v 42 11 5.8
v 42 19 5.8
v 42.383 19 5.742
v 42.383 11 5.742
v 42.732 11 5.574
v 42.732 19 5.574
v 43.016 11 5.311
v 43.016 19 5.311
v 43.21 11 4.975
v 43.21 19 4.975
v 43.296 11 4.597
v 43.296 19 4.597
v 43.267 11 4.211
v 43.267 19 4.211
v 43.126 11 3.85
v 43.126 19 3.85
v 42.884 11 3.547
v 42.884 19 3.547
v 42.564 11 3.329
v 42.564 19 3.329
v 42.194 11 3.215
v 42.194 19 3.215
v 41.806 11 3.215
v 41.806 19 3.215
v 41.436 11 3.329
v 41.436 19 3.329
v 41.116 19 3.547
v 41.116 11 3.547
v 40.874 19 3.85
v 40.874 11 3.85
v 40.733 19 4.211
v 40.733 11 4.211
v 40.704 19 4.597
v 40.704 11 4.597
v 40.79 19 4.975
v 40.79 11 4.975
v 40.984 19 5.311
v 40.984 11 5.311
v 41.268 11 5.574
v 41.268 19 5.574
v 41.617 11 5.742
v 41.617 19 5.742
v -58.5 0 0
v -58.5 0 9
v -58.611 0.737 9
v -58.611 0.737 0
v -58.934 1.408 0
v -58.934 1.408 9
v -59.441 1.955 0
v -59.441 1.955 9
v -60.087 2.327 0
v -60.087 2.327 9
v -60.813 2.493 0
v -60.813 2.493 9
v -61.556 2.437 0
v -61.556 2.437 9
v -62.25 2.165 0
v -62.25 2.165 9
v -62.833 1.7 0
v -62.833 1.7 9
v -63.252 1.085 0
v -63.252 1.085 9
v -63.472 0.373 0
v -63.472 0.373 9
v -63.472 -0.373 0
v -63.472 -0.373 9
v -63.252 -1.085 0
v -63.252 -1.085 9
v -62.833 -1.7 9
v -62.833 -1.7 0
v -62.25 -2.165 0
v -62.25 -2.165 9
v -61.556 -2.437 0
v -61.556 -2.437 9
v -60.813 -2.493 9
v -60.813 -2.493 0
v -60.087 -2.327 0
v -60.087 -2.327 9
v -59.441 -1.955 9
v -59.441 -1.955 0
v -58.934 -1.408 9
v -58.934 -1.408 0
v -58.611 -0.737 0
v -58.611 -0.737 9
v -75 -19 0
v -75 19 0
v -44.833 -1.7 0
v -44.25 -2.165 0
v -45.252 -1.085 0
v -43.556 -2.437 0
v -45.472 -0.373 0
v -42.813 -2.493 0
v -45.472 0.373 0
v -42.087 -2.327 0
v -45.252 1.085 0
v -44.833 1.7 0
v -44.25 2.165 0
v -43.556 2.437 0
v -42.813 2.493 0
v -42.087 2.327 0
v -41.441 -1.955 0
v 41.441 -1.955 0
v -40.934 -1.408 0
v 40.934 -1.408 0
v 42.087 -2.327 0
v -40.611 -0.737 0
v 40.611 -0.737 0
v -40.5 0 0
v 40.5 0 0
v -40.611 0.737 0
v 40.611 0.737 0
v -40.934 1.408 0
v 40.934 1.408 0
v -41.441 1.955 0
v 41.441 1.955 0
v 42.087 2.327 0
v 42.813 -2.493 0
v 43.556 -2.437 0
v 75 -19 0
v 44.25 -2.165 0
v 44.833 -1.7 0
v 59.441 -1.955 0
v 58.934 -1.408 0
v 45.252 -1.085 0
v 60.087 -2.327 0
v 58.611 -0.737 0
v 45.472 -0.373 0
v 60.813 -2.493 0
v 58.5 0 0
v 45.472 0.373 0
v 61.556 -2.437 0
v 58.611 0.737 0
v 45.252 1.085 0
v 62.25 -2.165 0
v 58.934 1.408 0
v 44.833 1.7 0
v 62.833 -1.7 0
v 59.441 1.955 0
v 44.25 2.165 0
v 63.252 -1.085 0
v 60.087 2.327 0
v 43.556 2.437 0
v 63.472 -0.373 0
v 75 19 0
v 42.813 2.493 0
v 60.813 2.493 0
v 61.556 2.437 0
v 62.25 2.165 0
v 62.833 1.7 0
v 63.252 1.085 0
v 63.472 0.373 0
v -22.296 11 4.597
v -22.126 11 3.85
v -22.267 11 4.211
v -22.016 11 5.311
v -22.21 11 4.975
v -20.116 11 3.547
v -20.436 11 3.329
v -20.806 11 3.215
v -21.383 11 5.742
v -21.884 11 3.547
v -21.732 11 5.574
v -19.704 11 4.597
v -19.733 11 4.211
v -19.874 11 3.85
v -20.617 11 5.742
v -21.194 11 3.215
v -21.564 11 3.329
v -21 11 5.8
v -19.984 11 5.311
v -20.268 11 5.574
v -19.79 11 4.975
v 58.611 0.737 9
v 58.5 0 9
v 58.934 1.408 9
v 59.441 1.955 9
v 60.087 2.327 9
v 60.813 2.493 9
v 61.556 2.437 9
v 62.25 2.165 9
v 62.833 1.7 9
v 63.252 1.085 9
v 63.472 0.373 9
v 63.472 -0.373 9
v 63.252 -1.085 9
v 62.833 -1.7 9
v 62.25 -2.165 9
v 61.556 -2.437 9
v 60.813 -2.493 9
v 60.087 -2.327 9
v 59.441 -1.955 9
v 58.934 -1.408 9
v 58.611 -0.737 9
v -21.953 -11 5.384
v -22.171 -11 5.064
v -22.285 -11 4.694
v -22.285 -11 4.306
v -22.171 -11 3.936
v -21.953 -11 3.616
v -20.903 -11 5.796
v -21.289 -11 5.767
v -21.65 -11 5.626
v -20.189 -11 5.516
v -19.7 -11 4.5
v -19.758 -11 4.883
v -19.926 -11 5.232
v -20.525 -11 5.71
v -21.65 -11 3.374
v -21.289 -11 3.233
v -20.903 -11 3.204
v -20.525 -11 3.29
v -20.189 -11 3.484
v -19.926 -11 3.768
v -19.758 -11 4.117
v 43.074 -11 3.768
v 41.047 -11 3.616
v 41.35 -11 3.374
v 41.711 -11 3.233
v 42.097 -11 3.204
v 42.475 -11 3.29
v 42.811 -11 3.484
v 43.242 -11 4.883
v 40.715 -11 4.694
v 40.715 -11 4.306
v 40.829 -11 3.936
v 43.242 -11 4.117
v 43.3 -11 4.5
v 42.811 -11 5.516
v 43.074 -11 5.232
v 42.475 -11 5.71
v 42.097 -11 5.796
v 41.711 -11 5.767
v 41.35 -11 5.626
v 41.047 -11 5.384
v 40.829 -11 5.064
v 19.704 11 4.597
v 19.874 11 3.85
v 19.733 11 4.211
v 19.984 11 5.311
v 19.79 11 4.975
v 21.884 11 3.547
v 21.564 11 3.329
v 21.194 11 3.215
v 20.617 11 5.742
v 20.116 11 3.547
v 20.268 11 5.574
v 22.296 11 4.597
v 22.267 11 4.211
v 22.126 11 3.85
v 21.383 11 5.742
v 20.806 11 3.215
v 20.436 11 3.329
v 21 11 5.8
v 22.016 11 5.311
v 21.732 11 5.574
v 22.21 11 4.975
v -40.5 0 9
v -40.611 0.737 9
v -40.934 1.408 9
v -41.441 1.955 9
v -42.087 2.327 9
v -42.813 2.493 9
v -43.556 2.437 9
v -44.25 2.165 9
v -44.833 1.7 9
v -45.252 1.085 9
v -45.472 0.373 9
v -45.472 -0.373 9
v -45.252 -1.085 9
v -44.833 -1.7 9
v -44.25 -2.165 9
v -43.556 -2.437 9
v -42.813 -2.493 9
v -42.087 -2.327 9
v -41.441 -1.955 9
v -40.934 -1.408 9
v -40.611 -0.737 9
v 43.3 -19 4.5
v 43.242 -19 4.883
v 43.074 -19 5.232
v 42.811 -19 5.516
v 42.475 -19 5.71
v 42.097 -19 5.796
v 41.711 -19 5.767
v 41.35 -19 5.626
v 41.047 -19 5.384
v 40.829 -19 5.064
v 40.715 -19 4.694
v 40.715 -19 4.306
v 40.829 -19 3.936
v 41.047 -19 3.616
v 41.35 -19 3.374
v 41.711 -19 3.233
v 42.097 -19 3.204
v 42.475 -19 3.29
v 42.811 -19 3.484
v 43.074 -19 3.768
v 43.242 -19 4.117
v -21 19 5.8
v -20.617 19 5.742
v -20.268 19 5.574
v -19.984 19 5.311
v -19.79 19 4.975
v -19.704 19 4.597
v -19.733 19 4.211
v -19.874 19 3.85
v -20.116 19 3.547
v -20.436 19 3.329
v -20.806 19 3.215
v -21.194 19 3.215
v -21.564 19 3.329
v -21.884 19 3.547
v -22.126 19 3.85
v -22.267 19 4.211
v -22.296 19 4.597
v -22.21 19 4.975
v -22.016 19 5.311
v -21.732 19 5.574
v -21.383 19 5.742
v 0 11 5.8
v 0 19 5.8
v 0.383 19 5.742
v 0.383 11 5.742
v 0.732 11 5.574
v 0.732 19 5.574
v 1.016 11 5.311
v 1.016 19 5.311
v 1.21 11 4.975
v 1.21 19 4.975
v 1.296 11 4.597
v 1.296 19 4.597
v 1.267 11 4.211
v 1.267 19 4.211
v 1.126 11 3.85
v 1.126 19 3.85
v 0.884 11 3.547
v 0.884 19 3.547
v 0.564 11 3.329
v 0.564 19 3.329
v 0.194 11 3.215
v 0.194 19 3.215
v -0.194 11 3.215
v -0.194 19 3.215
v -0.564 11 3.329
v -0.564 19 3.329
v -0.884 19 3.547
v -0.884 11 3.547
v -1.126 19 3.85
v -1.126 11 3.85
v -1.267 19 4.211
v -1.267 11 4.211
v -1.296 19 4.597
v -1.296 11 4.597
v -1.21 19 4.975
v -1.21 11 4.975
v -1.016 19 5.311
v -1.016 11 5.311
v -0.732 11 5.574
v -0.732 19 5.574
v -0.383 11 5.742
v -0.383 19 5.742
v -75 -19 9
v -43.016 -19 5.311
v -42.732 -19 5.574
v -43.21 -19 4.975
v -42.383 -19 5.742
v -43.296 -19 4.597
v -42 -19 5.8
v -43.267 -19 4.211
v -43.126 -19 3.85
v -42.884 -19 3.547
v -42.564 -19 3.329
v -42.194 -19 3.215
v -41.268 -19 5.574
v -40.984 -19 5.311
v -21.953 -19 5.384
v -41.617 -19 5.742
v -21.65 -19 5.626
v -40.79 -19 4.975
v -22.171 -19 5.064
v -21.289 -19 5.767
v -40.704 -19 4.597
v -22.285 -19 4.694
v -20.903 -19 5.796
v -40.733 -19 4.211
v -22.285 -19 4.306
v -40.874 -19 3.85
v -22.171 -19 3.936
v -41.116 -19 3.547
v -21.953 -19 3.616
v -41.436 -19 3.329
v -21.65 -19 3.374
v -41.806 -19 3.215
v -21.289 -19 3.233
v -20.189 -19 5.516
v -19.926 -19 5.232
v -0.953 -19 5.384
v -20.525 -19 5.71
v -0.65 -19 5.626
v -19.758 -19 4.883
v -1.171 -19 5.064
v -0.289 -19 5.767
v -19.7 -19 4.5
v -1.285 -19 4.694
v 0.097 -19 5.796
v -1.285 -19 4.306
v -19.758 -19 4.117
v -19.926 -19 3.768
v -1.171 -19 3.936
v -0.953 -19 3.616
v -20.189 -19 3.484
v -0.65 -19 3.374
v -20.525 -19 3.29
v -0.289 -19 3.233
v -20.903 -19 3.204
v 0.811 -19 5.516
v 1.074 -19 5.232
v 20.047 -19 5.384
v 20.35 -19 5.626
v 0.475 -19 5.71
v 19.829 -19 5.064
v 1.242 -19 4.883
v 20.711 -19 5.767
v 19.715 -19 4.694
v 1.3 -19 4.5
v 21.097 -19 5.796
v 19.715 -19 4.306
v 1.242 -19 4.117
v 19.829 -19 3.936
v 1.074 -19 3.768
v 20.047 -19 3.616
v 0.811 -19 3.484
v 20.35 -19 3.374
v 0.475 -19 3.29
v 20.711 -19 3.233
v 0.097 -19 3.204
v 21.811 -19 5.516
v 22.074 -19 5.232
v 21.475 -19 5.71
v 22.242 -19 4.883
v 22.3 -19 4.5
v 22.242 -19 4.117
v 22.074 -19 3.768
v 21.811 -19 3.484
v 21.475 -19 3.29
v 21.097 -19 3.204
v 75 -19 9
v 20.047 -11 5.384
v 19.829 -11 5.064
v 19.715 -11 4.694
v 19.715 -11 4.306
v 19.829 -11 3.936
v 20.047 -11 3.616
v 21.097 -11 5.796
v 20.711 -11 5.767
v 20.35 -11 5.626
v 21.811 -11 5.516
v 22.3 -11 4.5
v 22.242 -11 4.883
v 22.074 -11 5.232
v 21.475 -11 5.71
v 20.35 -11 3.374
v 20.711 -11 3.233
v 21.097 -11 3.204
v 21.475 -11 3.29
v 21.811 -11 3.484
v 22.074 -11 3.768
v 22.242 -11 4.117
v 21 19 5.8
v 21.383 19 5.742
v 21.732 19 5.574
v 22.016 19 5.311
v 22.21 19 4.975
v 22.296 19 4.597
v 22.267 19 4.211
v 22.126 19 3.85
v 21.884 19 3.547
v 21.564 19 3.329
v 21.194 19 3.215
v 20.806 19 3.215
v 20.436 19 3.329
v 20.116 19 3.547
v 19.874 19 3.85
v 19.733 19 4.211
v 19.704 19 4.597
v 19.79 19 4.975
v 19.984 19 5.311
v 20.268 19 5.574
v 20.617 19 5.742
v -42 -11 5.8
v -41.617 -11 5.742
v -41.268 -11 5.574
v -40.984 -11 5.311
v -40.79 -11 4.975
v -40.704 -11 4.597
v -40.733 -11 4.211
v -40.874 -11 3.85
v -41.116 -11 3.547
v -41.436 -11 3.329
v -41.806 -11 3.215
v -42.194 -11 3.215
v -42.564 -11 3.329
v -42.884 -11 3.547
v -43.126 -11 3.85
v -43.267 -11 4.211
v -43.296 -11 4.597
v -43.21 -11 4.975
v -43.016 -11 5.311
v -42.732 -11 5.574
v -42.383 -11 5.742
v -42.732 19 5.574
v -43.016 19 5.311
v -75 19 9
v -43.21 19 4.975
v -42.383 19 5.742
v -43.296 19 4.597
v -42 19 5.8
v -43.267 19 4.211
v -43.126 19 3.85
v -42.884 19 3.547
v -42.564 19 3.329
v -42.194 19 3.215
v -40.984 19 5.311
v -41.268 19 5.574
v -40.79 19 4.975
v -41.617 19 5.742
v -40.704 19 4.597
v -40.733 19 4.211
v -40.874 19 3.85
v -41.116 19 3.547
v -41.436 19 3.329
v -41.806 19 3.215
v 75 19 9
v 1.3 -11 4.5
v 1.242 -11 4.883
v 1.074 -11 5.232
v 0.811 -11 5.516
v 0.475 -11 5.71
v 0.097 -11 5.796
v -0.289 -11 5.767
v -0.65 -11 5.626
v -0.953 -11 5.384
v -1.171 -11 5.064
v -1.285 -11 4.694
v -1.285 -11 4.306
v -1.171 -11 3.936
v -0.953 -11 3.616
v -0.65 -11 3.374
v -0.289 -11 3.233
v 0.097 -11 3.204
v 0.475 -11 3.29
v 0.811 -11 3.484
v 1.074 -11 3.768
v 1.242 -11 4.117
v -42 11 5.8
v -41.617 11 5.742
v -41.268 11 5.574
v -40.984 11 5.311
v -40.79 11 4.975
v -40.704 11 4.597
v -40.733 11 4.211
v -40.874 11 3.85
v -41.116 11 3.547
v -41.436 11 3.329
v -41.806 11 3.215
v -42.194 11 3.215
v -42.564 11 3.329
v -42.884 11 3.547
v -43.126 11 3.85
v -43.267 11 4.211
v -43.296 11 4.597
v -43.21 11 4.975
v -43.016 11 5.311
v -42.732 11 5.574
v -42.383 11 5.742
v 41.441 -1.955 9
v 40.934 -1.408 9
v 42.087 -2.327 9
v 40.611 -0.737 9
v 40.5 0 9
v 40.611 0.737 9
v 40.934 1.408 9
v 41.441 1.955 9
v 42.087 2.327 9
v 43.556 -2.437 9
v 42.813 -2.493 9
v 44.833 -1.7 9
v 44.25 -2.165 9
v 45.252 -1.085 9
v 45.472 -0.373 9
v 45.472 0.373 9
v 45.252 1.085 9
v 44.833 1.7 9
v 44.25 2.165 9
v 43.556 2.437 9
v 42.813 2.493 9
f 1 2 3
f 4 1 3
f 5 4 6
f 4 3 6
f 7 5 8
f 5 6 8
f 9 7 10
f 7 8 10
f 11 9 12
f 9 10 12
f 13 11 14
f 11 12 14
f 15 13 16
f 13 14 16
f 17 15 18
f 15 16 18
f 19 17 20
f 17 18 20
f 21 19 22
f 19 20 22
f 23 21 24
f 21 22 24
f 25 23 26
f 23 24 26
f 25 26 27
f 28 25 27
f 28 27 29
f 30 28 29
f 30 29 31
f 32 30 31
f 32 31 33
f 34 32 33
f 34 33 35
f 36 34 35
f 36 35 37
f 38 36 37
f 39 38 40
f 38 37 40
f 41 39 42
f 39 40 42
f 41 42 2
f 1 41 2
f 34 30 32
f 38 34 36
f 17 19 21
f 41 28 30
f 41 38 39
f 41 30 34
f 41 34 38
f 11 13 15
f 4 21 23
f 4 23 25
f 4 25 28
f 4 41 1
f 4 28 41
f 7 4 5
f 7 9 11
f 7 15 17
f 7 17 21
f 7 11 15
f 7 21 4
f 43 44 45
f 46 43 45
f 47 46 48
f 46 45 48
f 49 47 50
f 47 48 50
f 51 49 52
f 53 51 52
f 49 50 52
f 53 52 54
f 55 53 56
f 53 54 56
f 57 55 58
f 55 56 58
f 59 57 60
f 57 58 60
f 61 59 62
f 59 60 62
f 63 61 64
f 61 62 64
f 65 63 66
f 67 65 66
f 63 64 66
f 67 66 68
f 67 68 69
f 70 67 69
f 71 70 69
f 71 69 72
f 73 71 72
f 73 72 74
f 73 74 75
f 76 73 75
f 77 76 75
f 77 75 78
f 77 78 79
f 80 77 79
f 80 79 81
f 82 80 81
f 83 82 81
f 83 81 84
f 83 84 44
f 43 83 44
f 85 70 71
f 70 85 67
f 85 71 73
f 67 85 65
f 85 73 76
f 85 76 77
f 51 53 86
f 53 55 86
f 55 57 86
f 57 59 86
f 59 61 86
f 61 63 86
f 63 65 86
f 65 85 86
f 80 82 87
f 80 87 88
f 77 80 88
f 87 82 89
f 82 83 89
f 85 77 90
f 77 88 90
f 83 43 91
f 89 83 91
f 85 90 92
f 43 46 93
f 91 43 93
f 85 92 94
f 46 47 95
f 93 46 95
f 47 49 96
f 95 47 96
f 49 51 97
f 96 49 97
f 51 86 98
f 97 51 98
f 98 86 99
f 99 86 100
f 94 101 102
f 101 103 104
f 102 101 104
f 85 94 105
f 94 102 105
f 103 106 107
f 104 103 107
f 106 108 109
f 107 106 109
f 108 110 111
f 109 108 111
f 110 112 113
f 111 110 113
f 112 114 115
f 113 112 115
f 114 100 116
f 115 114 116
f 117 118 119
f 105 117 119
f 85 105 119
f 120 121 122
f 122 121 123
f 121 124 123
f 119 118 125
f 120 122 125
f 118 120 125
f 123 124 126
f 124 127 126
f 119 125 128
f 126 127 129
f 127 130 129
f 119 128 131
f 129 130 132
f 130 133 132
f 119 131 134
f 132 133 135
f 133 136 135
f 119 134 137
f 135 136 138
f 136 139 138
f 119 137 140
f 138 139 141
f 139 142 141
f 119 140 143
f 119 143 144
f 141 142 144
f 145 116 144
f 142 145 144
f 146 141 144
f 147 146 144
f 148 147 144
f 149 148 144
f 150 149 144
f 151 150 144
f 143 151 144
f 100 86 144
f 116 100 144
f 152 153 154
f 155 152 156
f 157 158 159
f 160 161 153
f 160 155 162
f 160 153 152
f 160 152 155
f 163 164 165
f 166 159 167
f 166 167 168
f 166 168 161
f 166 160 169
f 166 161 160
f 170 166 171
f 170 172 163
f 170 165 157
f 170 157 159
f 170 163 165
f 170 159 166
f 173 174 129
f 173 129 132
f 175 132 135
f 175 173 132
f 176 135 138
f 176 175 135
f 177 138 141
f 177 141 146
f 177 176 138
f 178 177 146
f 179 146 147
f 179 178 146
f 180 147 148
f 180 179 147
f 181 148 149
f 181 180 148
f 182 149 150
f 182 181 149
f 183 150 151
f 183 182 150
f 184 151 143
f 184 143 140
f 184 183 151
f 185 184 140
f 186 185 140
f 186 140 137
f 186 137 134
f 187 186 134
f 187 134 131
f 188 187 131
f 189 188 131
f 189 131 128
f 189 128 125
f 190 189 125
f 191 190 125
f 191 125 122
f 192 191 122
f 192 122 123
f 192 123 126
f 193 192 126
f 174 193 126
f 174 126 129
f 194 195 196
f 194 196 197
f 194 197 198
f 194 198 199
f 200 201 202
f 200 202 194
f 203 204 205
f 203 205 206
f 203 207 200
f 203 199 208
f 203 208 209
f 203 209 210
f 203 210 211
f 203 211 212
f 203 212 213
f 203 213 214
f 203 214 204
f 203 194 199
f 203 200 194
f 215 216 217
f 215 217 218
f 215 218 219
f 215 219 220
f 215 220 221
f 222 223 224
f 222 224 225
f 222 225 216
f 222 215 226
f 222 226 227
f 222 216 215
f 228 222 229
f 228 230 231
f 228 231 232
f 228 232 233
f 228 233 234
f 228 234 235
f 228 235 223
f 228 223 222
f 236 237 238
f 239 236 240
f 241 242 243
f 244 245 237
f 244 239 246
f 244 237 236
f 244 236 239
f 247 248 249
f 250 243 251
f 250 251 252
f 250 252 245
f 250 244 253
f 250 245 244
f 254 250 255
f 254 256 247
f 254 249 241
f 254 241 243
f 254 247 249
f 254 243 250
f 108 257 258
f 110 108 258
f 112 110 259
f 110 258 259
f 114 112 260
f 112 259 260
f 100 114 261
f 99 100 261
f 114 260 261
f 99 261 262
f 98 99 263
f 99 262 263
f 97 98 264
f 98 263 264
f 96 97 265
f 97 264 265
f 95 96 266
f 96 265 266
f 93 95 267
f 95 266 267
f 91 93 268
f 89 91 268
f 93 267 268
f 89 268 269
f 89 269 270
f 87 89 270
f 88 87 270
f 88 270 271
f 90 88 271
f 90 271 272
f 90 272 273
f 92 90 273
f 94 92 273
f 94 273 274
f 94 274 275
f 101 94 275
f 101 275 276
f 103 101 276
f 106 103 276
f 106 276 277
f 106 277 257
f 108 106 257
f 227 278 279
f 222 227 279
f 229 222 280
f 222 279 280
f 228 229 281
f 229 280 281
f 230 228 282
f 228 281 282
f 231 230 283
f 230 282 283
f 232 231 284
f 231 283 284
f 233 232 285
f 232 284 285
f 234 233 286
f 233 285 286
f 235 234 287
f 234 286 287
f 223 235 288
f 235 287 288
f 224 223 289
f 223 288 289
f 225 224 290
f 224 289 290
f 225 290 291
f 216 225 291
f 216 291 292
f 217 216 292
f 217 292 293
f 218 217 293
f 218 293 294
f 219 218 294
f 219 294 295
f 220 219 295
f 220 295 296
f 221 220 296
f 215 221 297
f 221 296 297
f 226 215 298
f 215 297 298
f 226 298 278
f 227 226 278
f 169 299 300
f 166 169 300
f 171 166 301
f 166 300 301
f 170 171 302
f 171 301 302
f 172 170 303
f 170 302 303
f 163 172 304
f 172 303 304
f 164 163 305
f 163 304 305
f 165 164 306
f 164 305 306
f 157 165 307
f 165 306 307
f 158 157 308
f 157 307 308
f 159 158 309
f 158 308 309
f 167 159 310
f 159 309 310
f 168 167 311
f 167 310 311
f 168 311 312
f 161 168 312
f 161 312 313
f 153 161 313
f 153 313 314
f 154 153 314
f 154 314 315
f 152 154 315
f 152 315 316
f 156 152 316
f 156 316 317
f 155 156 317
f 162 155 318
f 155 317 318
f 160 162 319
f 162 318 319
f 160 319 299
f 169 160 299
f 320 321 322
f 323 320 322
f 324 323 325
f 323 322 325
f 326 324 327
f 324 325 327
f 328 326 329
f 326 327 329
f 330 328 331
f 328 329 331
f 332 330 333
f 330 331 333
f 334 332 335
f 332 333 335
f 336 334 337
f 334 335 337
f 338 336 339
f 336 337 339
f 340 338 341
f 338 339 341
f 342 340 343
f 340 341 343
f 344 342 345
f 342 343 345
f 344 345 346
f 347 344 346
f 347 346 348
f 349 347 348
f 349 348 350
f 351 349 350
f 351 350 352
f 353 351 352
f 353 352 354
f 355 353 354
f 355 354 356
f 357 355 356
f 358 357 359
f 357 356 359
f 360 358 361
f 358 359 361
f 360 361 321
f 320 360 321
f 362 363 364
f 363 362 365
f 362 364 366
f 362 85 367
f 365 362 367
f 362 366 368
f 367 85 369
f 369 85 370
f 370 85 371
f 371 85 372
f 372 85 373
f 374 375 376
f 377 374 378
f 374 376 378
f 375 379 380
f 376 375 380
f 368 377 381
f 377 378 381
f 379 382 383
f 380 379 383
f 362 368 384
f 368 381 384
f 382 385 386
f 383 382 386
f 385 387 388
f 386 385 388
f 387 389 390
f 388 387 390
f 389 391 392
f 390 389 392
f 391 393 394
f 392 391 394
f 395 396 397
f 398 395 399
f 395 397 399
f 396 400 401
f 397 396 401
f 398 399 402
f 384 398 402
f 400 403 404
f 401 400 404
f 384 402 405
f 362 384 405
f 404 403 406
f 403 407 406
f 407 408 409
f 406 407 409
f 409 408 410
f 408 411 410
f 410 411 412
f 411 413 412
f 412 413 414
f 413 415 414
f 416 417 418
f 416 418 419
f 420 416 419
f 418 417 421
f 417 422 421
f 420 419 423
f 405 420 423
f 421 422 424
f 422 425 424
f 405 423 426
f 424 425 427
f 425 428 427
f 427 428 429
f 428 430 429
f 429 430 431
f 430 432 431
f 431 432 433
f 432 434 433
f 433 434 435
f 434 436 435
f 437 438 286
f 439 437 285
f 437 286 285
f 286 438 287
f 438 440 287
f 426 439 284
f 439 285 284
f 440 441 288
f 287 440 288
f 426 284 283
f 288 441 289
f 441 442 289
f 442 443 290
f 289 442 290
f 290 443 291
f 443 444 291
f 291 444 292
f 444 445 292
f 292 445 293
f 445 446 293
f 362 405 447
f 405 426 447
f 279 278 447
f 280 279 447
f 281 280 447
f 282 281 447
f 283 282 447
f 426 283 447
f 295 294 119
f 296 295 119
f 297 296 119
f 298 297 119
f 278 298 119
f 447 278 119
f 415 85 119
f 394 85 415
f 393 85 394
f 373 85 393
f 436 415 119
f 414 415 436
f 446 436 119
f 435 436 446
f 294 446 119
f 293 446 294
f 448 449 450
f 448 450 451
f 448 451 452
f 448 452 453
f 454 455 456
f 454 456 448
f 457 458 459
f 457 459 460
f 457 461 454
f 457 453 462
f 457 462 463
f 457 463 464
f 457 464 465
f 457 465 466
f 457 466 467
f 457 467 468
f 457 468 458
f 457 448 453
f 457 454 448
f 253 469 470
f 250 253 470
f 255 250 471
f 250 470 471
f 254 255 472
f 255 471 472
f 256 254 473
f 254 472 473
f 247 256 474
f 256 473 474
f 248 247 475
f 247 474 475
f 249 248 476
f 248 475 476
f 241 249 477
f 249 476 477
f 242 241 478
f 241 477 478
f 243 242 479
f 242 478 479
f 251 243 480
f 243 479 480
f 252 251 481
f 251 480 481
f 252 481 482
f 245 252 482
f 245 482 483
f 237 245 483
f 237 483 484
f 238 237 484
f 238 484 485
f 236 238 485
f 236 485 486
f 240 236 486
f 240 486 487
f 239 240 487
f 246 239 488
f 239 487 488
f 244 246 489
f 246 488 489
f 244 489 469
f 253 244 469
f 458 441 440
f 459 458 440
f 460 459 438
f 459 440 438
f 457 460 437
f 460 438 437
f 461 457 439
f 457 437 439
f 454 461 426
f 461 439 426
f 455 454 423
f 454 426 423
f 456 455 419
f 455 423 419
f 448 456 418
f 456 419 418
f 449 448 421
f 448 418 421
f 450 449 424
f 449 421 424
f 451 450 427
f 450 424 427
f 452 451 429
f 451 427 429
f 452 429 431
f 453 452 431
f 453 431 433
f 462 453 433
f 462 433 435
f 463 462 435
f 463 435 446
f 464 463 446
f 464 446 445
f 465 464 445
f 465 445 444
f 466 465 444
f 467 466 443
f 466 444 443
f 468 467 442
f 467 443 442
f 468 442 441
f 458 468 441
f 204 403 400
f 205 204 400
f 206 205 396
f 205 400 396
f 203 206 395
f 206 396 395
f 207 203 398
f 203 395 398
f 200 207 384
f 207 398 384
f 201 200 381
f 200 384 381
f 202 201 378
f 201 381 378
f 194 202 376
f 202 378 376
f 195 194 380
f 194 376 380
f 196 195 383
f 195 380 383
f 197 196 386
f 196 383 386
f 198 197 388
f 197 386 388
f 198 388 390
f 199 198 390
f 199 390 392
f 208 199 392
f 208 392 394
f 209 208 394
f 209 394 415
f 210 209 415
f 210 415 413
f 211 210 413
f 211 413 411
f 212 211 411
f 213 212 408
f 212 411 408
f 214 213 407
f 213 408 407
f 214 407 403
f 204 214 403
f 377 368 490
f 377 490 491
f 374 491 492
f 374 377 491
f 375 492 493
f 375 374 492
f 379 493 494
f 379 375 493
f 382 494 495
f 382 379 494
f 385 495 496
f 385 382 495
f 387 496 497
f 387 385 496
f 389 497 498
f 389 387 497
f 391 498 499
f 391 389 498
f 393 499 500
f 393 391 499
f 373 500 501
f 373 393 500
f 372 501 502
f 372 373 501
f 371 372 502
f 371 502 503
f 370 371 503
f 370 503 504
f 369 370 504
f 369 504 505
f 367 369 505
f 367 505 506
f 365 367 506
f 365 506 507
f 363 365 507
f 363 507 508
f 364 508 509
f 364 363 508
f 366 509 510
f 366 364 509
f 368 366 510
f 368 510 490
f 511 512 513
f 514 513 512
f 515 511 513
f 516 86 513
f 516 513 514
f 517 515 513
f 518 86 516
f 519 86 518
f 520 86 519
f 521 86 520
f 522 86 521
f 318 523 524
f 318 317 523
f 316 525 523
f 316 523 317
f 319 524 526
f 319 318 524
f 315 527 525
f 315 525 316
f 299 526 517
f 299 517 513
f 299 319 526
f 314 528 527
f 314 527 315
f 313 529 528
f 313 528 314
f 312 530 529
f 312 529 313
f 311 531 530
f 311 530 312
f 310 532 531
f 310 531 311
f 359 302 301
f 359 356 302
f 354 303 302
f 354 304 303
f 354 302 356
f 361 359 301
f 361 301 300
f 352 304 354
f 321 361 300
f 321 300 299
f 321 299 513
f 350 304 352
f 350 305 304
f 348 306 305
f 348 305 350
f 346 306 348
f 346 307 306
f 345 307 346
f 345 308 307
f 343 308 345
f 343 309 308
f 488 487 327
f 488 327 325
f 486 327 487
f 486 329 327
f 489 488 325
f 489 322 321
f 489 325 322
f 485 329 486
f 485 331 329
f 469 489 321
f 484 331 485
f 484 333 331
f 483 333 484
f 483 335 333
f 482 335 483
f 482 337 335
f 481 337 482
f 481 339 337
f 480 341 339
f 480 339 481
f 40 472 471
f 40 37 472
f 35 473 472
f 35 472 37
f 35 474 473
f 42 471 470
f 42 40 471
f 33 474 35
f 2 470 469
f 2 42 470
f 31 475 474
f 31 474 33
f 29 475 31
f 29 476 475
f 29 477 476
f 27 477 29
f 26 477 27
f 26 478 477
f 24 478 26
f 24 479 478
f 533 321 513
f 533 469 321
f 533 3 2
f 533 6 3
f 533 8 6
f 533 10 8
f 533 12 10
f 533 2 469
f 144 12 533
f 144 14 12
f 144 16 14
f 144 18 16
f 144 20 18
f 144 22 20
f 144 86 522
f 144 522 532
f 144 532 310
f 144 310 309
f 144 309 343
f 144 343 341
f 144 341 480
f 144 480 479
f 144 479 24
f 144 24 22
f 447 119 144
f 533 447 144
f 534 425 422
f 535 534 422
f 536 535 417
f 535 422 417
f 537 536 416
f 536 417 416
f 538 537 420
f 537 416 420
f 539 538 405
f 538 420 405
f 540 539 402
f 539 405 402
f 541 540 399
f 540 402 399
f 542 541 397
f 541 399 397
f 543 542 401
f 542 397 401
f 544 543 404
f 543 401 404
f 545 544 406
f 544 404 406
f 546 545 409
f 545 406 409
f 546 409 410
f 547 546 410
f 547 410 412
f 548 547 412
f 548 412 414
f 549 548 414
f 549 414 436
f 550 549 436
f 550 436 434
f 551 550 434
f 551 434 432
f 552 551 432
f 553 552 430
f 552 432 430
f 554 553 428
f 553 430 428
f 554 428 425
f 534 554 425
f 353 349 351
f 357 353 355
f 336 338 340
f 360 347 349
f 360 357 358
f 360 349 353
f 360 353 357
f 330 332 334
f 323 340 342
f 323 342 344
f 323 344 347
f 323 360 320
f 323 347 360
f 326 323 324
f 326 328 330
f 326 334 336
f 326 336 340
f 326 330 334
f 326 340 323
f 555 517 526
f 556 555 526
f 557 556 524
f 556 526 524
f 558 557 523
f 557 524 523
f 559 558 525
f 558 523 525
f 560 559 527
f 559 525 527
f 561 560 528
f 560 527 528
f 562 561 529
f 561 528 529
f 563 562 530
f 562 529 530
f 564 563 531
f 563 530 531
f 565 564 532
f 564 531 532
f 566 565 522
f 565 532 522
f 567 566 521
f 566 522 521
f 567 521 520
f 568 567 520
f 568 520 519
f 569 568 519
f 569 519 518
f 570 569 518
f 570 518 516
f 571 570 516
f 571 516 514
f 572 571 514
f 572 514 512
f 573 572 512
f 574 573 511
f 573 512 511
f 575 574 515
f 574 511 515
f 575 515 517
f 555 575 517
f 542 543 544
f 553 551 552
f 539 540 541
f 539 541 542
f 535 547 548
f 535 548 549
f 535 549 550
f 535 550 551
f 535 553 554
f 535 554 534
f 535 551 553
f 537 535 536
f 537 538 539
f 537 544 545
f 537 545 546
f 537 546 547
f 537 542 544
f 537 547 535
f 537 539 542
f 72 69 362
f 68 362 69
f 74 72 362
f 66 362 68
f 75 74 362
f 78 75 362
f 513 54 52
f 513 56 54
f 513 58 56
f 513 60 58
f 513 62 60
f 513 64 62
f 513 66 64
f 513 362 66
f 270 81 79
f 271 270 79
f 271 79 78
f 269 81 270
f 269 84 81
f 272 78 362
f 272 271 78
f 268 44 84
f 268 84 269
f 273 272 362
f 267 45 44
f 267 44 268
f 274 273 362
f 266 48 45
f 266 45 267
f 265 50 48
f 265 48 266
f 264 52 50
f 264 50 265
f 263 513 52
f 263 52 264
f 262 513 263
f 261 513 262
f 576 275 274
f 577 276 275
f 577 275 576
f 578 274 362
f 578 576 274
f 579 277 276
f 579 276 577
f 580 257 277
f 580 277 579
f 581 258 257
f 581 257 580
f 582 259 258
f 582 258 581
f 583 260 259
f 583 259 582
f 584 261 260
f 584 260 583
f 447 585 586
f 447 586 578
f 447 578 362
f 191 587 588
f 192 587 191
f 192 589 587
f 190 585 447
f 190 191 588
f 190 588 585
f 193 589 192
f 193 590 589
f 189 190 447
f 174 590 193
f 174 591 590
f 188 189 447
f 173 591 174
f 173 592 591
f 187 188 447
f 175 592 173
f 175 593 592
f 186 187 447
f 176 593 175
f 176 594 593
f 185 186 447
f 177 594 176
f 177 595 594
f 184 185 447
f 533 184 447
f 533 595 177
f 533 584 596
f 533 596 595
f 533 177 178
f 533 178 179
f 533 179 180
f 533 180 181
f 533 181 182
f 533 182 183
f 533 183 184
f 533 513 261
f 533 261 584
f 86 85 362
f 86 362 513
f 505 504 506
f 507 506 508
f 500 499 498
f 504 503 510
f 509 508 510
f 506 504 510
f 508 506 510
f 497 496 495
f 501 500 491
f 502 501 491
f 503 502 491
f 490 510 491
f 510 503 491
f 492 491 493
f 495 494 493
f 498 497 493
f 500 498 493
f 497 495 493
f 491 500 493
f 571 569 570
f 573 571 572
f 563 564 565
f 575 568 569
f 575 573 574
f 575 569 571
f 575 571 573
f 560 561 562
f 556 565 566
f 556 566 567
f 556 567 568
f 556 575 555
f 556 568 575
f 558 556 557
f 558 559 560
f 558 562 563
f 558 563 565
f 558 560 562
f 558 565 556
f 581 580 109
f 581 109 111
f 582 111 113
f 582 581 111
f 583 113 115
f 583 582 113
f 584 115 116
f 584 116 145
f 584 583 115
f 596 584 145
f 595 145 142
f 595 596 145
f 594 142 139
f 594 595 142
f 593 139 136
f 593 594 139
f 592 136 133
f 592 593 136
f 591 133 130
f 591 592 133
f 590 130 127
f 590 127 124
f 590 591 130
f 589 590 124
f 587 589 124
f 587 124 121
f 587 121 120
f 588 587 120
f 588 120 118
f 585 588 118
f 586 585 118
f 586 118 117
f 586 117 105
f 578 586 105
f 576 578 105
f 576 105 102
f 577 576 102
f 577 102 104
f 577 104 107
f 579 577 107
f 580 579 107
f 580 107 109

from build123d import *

# Parameters (mm, degrees)
SKETCH_1_W               = 150
SKETCH_1_H               = 38
EXTRUDE_1_DEPTH          = 9
SKETCH_2_R               = 1.3
CUT_EXTRUDE_1_DEPTH      = 8
PATTERN_LINEAR_1_COUNT   = 5
PATTERN_LINEAR_1_PITCH   = 21
MIRROR_1_COPY_1_SKETCH_R = 1.3
MIRROR_1_COPY_1_DEPTH    = 8
MIRROR_1_COPY_2_SKETCH_R = 1.3
MIRROR_1_COPY_2_DEPTH    = 8
MIRROR_1_COPY_3_SKETCH_R = 1.3
MIRROR_1_COPY_3_DEPTH    = 8
MIRROR_1_COPY_4_SKETCH_R = 1.3
MIRROR_1_COPY_4_DEPTH    = 8
CUT_EXTRUDE_2_REACH      = 79.891
SKETCH_3_R               = 2.5


with BuildPart() as part:
    # 草圖1 → 填料-伸長1 (new body)
    with BuildSketch(Plane.XY):
        Rectangle(SKETCH_1_W, SKETCH_1_H)
    extrude(amount=EXTRUDE_1_DEPTH)

    # 草圖2 → 除料-伸長1 (cut)
    with BuildSketch(Plane(origin=(0, 19, 0), x_dir=(1, 0, 0), z_dir=(0, 1, 0))):
        with Locations(Location((-42, -4.5, 0), (0, 0, 270))):
            Circle(SKETCH_2_R)
    cut_extrude_1 = extrude(amount=-CUT_EXTRUDE_1_DEPTH, mode=Mode.SUBTRACT)

    # 直線複製排列1: 除料-伸長1 ×5
    with Locations(*[(i * PATTERN_LINEAR_1_PITCH, 0, 0) for i in range(1, PATTERN_LINEAR_1_COUNT)]):
        add(cut_extrude_1, mode=Mode.SUBTRACT)

    # 鏡射1: 除料-伸長1 across plane
    add(cut_extrude_1.mirror(Plane.ZX), mode=Mode.SUBTRACT)

    # 鏡射1 copy 1 sketch → 鏡射1 copy 1 (cut)
    with BuildSketch(Plane(origin=(21, -19, 0), x_dir=(1, 0, 0), z_dir=(0, -1, 0))):
        with Locations((-42, 4.5)):
            Circle(MIRROR_1_COPY_1_SKETCH_R)
    extrude(amount=-MIRROR_1_COPY_1_DEPTH, mode=Mode.SUBTRACT)

    # 鏡射1 copy 2 sketch → 鏡射1 copy 2 (cut)
    with BuildSketch(Plane(origin=(42, -19, 0), x_dir=(1, 0, 0), z_dir=(0, -1, 0))):
        with Locations((-42, 4.5)):
            Circle(MIRROR_1_COPY_2_SKETCH_R)
    extrude(amount=-MIRROR_1_COPY_2_DEPTH, mode=Mode.SUBTRACT)

    # 鏡射1 copy 3 sketch → 鏡射1 copy 3 (cut)
    with BuildSketch(Plane(origin=(63, -19, 0), x_dir=(1, 0, 0), z_dir=(0, -1, 0))):
        with Locations((-42, 4.5)):
            Circle(MIRROR_1_COPY_3_SKETCH_R)
    extrude(amount=-MIRROR_1_COPY_3_DEPTH, mode=Mode.SUBTRACT)

    # 鏡射1 copy 4 sketch → 鏡射1 copy 4 (cut)
    with BuildSketch(Plane(origin=(84, -19, 0), x_dir=(1, 0, 0), z_dir=(0, -1, 0))):
        with Locations((-42, 4.5)):
            Circle(MIRROR_1_COPY_4_SKETCH_R)
    extrude(amount=-MIRROR_1_COPY_4_DEPTH, mode=Mode.SUBTRACT)

    # 草圖3 → 除料-伸長2 (cut, up to next)
    with BuildSketch(Plane.XY.offset(9), mode=Mode.PRIVATE) as cut_extrude_2_sk1:
        with Locations((-61, 0)):
            Circle(SKETCH_3_R)
    cut_extrude_2_tool1 = extrude(cut_extrude_2_sk1.sketch, amount=-CUT_EXTRUDE_2_REACH, mode=Mode.PRIVATE) & part.part
    # 草圖3 → 除料-伸長2 (cut, up to next)
    with BuildSketch(Plane.XY.offset(9), mode=Mode.PRIVATE) as cut_extrude_2_sk2:
        with Locations((-43, 0)):
            Circle(SKETCH_3_R)
    cut_extrude_2_tool2 = extrude(cut_extrude_2_sk2.sketch, amount=-CUT_EXTRUDE_2_REACH, mode=Mode.PRIVATE) & part.part
    cut_extrude_2_1 = cut_extrude_2_tool1.solids().sort_by_distance((-61, 0, 9))[0]
    add(cut_extrude_2_1, mode=Mode.SUBTRACT)
    cut_extrude_2_2 = cut_extrude_2_tool2.solids().sort_by_distance((-43, 0, 9))[0]
    add(cut_extrude_2_2, mode=Mode.SUBTRACT)
    cut_extrude_2 = cut_extrude_2_1 + cut_extrude_2_2  # 除料-伸長2 as one shape, for the pattern or mirror that repeats it

    # 鏡射2: 除料-伸長2 across plane
    add(cut_extrude_2.mirror(Plane(origin=(0, 0, 0), x_dir=(0, 0, 1), z_dir=(1, 0, 0))), mode=Mode.SUBTRACT)


solid = part.part
